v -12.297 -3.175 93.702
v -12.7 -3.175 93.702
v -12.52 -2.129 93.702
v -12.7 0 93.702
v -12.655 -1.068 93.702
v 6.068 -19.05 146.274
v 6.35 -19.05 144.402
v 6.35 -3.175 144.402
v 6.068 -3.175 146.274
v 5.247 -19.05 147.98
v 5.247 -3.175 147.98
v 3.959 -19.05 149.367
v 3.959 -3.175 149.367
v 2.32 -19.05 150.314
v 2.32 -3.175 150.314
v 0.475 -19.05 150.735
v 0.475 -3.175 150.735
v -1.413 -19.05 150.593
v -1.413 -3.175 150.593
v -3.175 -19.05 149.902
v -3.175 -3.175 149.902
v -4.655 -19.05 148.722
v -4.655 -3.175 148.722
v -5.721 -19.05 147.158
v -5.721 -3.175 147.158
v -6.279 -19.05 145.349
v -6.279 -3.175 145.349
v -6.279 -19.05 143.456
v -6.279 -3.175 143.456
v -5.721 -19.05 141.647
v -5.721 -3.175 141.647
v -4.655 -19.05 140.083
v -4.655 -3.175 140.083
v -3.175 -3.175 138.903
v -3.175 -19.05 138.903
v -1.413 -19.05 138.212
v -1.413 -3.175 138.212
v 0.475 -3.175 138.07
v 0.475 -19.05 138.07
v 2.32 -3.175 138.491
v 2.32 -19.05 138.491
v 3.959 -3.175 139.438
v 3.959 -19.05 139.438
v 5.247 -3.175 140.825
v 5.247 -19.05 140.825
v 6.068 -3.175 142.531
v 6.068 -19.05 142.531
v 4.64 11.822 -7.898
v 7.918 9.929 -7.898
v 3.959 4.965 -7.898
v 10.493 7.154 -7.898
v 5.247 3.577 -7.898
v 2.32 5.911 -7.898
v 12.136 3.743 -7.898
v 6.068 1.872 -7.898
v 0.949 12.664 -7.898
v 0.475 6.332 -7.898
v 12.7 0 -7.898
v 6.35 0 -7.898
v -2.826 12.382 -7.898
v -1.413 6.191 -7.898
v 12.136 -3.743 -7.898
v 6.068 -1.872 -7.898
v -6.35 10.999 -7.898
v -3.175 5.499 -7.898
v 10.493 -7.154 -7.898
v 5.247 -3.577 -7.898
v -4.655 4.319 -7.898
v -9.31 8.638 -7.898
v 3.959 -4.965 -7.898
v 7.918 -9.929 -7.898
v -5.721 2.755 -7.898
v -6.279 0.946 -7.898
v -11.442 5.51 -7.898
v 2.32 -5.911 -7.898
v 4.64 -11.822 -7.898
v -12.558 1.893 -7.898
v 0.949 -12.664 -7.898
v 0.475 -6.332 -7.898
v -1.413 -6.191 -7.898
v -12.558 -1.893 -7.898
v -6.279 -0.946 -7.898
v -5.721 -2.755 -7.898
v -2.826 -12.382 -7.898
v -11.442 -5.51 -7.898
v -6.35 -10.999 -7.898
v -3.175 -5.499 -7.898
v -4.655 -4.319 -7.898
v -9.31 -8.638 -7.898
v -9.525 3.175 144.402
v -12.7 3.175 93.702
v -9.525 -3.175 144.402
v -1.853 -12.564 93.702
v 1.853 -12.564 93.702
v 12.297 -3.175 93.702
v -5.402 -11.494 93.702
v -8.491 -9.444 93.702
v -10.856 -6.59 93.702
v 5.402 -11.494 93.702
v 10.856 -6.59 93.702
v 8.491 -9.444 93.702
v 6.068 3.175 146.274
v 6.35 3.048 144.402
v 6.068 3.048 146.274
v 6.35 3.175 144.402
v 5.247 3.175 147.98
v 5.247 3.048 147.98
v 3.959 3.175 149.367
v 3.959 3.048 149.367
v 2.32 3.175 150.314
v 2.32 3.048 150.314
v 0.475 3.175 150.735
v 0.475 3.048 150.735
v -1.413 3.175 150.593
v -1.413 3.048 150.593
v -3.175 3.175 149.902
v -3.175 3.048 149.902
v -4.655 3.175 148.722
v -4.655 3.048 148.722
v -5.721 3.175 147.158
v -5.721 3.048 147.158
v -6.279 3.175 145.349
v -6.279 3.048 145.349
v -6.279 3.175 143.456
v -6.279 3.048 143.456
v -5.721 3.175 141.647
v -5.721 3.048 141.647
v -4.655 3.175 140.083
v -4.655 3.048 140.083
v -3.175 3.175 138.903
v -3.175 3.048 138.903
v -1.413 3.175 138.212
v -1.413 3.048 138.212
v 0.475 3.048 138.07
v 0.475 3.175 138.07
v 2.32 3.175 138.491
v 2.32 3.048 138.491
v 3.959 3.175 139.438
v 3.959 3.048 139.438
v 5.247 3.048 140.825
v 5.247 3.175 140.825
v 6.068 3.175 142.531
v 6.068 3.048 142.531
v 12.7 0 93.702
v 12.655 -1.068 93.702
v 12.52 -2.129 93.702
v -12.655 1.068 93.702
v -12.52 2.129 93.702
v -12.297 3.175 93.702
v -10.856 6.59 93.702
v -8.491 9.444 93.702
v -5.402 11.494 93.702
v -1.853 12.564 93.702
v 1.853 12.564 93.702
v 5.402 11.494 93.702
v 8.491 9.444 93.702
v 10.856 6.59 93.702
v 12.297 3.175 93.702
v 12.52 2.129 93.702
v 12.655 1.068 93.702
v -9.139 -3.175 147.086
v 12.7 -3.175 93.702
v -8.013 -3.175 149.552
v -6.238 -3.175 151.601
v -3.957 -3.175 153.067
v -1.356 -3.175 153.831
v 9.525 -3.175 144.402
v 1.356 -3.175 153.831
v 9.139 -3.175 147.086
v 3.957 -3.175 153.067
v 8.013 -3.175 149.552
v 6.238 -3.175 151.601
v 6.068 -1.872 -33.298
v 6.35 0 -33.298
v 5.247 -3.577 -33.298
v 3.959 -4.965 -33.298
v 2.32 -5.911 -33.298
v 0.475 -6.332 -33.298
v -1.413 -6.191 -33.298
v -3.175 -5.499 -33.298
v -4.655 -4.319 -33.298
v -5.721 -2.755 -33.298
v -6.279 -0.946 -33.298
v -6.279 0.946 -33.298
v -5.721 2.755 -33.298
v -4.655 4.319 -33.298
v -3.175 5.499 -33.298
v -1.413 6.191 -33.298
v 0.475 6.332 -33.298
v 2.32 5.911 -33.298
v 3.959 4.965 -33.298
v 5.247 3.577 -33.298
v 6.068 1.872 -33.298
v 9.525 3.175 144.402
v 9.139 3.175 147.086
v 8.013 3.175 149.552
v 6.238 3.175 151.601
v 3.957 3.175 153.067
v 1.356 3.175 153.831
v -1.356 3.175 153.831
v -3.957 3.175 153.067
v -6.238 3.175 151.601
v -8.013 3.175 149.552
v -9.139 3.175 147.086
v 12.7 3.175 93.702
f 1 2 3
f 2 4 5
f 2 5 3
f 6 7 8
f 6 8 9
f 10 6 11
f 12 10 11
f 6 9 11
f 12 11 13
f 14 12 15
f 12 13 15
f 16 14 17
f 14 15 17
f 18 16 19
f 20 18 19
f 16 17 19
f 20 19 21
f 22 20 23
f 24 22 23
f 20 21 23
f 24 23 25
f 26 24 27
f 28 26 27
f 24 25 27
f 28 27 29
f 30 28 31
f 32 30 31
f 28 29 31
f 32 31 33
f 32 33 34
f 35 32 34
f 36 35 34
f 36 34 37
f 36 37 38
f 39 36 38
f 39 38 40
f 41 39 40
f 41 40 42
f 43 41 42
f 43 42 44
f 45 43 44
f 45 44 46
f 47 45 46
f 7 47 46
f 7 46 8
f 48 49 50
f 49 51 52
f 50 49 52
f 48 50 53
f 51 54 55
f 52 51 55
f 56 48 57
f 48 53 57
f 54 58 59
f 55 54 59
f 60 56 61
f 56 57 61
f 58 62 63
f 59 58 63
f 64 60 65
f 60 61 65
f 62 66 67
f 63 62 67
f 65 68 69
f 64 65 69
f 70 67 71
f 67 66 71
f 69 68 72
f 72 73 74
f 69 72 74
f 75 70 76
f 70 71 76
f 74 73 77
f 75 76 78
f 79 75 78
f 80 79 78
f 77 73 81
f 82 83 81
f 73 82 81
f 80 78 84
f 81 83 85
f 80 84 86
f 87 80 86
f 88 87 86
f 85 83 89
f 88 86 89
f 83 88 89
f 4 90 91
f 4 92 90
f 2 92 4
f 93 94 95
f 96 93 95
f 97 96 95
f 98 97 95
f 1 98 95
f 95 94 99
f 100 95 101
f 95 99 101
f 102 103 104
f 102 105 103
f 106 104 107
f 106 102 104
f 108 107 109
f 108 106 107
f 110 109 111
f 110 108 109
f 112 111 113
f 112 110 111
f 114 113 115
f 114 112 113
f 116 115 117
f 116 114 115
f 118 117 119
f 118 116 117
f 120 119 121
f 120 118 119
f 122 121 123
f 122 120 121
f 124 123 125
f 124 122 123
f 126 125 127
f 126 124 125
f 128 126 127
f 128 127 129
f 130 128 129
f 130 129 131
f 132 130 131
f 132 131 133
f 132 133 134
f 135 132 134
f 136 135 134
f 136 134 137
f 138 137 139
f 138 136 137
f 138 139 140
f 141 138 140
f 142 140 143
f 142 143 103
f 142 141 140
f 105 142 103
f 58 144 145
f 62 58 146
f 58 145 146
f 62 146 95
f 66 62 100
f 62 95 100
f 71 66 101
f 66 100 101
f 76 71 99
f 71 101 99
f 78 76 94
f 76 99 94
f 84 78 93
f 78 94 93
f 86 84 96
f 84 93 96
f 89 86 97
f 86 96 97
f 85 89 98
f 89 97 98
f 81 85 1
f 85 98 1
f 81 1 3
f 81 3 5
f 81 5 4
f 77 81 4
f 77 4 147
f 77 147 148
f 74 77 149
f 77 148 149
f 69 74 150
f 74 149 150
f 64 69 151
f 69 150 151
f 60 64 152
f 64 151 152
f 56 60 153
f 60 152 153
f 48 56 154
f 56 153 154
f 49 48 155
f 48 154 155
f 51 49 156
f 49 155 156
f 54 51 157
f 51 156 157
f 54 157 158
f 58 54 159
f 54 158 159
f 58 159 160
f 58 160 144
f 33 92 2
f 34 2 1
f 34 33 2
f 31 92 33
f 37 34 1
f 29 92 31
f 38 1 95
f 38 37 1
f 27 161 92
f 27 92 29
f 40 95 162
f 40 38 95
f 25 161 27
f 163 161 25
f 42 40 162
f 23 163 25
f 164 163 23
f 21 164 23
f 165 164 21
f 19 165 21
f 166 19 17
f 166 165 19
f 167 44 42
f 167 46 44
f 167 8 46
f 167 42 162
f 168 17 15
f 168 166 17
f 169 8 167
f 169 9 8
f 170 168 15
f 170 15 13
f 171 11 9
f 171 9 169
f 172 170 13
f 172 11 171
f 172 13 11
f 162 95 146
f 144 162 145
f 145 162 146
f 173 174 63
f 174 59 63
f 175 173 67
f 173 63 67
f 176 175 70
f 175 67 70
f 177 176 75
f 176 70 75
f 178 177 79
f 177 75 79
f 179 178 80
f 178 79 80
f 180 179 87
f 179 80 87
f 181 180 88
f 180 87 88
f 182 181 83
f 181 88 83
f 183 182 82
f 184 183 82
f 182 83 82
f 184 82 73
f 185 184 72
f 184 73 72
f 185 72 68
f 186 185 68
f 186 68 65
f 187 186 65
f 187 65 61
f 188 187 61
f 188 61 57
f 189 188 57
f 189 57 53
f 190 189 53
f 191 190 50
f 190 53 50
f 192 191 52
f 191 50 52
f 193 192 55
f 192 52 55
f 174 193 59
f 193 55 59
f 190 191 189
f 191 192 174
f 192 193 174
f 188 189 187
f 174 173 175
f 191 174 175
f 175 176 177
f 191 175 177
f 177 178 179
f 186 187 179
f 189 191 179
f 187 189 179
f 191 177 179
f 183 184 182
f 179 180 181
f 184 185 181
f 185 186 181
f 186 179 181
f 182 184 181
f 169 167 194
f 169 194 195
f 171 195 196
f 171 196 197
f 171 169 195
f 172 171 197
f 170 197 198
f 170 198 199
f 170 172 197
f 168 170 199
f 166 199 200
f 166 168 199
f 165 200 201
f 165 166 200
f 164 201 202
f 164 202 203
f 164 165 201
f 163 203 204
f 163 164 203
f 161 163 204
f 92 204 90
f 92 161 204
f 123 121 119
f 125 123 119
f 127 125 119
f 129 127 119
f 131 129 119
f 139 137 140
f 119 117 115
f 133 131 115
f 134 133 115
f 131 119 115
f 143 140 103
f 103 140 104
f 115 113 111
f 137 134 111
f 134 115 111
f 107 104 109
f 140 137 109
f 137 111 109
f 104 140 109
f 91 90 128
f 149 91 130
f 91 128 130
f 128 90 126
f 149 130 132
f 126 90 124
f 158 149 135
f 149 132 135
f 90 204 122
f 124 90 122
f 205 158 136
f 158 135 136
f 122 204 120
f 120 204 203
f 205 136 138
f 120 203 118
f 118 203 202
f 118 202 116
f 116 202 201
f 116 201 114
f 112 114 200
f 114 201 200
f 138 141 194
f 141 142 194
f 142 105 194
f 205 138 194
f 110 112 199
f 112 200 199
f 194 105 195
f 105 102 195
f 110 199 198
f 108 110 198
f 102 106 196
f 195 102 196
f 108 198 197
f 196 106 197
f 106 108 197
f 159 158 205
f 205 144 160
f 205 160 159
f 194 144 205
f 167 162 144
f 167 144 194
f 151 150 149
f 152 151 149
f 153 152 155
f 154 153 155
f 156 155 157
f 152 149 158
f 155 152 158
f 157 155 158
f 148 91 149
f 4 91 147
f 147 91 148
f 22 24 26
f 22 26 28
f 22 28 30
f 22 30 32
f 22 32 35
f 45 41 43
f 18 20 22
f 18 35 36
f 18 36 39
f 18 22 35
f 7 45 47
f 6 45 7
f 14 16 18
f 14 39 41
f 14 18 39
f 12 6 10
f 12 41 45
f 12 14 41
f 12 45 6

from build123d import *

# Parameters (mm, degrees)
F2_DEPTH = 3.175
F0_R     = 6.35
F3_DEPTH = 3.175
F4_DEPTH = 19.05
F0_W     = 6.35
F0_H     = 25.4
F6_DEPTH = 3.048


with BuildPart() as f1:
    # F0 (on Front) → F1 (revolve)
    with BuildSketch(Plane.XZ):
        Polygon((12.7, 93.701775), (0, 93.701775), (0, -7.898225), (6.35, -7.898225), (12.7, -7.898225), align=None)
    revolve(axis=Axis((0, 0, 42.901775), (0, 0, -1)))

    # F0 (on Front) → F2 (join, symmetric)
    with BuildSketch(Plane.XZ):
        with BuildLine():
            Line((-9.525, 144.402459), (-12.7, 93.701775))
            Line((-12.7, 93.701775), (0, 93.701775))
            Line((0, 93.701775), (12.7, 93.701775))
            Line((12.7, 93.701775), (9.525, 144.402459))
            ThreePointArc((9.525, 144.402459), (0, 134.877459), (-9.525, 144.402459))
        make_face()
    extrude(amount=F2_DEPTH, both=True)

    # F0 (on Front) → F3 (join, symmetric)
    with BuildSketch(Plane.XZ):
        with BuildLine():
            ThreePointArc((9.525, 144.402459), (0, 153.927459), (-9.525, 144.402459))
            ThreePointArc((-9.525, 144.402459), (0, 134.877459), (9.525, 144.402459))
        make_face()
        with Locations((0, 144.402459)):
            Circle(F0_R, mode=Mode.SUBTRACT)
    extrude(amount=F3_DEPTH, both=True)

    # F0 (on Front) → F4 (join)
    with BuildSketch(Plane.XZ):
        with Locations((0, 144.402459)):
            Circle(F0_R)
    extrude(amount=F4_DEPTH)

    # F0 (on Front) → F5 (revolve)
    with BuildSketch(Plane.XZ):
        with Locations((3.175, -20.598225)):
            Rectangle(F0_W, F0_H)
    revolve(axis=Axis((0, 0, -20.598225), (0, 0, -1)))

    # F0 (on Front) → F6 (join)
    with BuildSketch(Plane.XZ):
        with Locations((0, 144.402459)):
            Circle(F0_R)
    extrude(amount=-F6_DEPTH)


solid = f1.part
